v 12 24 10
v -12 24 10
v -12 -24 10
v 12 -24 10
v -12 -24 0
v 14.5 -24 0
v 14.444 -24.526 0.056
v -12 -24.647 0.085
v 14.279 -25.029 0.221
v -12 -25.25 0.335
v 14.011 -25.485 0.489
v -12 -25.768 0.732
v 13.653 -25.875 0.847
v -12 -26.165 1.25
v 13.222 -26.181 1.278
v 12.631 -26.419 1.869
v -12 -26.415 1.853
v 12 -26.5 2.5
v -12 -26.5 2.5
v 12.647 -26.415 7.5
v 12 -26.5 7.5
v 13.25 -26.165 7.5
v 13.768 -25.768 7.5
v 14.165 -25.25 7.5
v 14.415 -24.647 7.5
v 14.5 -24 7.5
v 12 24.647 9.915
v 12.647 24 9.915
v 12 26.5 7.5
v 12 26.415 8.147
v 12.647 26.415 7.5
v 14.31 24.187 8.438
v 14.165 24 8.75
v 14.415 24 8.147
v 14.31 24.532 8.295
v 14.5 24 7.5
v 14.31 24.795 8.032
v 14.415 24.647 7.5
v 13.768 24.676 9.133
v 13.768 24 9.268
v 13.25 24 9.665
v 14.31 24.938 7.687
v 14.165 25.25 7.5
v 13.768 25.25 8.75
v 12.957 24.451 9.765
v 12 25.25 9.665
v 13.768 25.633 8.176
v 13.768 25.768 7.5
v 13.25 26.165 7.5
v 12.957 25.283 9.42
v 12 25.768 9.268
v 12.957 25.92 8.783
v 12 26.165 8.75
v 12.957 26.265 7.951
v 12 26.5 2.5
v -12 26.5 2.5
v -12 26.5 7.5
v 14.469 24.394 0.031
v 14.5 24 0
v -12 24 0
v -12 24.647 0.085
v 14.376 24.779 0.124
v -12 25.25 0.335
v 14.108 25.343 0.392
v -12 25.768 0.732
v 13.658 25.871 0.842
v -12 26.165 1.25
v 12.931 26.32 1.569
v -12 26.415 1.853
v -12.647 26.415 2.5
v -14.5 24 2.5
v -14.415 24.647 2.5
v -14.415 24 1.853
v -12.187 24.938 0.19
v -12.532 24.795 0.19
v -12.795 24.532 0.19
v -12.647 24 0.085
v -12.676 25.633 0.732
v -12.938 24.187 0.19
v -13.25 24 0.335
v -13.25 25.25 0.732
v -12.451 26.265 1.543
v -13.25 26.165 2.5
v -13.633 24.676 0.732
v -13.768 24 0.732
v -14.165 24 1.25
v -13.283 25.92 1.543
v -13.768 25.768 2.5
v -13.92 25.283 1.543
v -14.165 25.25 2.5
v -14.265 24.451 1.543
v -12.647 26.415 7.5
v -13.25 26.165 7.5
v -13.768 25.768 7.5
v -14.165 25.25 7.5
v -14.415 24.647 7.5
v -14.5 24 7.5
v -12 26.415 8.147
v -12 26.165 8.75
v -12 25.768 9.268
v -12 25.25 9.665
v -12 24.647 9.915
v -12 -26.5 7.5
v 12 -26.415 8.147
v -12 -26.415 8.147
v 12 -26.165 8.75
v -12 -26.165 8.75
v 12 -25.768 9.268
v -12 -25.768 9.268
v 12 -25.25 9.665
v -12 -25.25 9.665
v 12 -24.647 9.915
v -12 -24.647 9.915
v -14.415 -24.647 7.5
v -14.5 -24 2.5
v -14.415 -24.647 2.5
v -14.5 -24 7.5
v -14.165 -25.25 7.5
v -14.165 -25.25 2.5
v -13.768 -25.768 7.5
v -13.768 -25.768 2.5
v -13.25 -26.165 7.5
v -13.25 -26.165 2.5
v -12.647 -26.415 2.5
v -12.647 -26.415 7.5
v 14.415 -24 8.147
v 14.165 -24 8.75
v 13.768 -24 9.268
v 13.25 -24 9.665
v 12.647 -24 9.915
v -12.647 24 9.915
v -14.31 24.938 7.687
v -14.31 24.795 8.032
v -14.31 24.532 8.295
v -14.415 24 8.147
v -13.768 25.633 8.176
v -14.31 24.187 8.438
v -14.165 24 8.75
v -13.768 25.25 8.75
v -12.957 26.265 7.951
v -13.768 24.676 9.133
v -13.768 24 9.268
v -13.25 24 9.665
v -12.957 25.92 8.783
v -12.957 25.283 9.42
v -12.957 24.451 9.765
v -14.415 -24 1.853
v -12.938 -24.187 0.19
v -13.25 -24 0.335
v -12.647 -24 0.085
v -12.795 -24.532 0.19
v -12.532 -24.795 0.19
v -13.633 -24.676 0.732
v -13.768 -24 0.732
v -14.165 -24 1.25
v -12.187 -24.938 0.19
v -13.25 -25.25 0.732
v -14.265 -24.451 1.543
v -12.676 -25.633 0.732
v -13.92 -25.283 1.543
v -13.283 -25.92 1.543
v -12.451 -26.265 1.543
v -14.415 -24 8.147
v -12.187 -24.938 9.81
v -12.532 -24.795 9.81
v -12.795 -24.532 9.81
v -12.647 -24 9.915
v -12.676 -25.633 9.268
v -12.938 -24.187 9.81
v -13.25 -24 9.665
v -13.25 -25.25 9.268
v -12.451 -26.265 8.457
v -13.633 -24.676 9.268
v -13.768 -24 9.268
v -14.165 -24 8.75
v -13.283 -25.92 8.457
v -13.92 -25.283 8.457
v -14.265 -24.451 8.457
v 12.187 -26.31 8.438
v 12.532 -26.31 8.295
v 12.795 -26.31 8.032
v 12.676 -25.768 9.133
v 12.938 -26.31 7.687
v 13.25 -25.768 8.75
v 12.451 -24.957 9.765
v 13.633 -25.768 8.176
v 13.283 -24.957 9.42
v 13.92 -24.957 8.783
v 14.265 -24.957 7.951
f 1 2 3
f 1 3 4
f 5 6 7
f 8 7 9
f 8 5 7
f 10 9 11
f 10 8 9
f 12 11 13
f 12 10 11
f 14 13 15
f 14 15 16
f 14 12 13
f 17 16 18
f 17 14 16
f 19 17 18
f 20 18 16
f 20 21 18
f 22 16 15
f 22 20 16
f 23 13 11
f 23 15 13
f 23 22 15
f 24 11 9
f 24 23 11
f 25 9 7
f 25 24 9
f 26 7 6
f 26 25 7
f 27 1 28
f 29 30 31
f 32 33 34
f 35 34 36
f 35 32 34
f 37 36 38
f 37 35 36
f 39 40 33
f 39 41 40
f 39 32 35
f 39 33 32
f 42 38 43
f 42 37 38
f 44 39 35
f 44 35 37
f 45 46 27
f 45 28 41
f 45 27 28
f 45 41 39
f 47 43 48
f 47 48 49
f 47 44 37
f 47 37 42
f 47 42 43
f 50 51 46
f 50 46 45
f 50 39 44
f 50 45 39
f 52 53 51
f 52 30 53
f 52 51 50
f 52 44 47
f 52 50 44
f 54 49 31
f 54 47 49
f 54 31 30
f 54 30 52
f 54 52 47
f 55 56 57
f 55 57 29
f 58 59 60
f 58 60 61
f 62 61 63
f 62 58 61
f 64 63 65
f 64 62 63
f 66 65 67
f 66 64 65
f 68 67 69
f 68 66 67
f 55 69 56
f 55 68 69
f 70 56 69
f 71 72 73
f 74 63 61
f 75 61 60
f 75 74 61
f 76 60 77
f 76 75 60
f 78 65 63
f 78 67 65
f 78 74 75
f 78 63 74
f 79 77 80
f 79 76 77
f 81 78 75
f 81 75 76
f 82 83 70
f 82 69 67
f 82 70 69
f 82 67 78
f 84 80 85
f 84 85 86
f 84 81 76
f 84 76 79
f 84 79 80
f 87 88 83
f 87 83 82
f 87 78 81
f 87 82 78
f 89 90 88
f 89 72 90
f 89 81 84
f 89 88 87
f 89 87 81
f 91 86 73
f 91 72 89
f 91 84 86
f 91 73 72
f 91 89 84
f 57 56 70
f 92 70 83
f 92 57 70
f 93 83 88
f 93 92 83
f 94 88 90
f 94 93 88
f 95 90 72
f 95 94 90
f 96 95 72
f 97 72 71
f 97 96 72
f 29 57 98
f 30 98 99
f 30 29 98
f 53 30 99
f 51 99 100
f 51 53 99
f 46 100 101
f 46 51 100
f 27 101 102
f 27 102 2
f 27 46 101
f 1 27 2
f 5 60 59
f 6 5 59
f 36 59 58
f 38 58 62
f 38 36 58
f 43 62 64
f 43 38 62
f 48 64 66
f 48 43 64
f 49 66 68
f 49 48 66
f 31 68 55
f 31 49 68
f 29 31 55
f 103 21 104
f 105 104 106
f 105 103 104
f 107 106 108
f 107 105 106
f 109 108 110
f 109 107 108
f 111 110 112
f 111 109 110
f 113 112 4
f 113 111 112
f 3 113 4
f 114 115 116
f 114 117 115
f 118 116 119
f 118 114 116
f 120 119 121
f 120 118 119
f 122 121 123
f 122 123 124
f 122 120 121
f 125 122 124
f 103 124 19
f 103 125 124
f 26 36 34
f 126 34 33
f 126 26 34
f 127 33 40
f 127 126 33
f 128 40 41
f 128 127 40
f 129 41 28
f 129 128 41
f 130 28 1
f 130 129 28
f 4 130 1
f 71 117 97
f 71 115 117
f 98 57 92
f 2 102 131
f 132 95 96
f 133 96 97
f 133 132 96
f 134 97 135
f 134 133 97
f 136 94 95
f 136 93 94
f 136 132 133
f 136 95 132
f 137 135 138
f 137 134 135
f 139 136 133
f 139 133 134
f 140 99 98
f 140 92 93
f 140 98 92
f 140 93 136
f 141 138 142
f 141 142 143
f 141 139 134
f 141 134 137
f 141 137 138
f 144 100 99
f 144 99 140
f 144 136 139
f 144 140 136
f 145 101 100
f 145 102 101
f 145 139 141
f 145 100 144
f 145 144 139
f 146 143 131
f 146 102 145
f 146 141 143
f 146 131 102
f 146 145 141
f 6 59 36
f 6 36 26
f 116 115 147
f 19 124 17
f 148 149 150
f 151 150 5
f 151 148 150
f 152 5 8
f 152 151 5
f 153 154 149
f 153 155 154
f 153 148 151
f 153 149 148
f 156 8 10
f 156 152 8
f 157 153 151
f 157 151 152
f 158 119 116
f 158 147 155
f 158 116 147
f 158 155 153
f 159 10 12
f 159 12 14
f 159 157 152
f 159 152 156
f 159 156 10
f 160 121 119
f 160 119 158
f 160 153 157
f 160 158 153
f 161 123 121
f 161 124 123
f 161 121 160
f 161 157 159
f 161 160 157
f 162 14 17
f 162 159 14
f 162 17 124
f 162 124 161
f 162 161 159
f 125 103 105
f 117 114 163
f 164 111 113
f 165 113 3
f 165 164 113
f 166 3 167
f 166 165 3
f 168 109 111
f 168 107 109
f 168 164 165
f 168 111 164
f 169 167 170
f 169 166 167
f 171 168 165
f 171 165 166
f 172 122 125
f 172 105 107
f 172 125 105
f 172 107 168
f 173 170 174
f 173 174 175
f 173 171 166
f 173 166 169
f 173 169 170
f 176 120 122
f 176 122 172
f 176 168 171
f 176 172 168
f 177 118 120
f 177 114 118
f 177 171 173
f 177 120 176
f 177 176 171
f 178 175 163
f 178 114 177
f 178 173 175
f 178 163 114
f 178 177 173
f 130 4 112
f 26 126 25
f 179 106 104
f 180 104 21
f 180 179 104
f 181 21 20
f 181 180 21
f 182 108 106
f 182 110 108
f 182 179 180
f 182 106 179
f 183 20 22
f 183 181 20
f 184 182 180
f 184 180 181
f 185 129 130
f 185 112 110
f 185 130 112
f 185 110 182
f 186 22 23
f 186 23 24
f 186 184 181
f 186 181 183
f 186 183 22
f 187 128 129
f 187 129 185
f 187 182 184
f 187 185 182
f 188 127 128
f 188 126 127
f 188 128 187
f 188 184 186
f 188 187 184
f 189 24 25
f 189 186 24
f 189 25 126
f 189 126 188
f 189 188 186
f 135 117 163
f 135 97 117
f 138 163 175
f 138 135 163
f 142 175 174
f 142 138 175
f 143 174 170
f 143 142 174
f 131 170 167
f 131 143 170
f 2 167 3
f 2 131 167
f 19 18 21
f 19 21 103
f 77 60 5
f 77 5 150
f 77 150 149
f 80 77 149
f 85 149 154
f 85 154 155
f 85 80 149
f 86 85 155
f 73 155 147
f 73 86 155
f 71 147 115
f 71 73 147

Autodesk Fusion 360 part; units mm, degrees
sketch "Sketch1" plane through (0, 0, 0) normal (0, 0, 1) x (1, 0, 0)
  line L0 (-14.5, 26.5) -> (14.5, 26.5)
  line L1 (14.5, 26.5) -> (14.5, -26.5)
  line L2 (14.5, -26.5) -> (-14.5, -26.5)
  line L3 (-14.5, -26.5) -> (-14.5, 26.5)
  dimension "d1" = 29
  dimension "d2" = 53
extrude "Extrude1" add sketch "Sketch1" along normal blind 10
fillet "Fillet1" radius 2.5 9 edges at (-14.5, -26.5, 5) (0, 26.5, 10) (-14.5, 26.5, 5) (0, 26.5, 0) (14.5, 0, 10) (0, -26.5, 10) (-14.5, 0, 0) (-14.5, 0, 10) (14.5, 26.5, 5) 4 faces at (4.8333, -26.5, 3.3333) (-4.8333, 26.5, 3.3333) (-4.8333, -8.8333, 10) (-14.5, -8.8333, 3.3333)
